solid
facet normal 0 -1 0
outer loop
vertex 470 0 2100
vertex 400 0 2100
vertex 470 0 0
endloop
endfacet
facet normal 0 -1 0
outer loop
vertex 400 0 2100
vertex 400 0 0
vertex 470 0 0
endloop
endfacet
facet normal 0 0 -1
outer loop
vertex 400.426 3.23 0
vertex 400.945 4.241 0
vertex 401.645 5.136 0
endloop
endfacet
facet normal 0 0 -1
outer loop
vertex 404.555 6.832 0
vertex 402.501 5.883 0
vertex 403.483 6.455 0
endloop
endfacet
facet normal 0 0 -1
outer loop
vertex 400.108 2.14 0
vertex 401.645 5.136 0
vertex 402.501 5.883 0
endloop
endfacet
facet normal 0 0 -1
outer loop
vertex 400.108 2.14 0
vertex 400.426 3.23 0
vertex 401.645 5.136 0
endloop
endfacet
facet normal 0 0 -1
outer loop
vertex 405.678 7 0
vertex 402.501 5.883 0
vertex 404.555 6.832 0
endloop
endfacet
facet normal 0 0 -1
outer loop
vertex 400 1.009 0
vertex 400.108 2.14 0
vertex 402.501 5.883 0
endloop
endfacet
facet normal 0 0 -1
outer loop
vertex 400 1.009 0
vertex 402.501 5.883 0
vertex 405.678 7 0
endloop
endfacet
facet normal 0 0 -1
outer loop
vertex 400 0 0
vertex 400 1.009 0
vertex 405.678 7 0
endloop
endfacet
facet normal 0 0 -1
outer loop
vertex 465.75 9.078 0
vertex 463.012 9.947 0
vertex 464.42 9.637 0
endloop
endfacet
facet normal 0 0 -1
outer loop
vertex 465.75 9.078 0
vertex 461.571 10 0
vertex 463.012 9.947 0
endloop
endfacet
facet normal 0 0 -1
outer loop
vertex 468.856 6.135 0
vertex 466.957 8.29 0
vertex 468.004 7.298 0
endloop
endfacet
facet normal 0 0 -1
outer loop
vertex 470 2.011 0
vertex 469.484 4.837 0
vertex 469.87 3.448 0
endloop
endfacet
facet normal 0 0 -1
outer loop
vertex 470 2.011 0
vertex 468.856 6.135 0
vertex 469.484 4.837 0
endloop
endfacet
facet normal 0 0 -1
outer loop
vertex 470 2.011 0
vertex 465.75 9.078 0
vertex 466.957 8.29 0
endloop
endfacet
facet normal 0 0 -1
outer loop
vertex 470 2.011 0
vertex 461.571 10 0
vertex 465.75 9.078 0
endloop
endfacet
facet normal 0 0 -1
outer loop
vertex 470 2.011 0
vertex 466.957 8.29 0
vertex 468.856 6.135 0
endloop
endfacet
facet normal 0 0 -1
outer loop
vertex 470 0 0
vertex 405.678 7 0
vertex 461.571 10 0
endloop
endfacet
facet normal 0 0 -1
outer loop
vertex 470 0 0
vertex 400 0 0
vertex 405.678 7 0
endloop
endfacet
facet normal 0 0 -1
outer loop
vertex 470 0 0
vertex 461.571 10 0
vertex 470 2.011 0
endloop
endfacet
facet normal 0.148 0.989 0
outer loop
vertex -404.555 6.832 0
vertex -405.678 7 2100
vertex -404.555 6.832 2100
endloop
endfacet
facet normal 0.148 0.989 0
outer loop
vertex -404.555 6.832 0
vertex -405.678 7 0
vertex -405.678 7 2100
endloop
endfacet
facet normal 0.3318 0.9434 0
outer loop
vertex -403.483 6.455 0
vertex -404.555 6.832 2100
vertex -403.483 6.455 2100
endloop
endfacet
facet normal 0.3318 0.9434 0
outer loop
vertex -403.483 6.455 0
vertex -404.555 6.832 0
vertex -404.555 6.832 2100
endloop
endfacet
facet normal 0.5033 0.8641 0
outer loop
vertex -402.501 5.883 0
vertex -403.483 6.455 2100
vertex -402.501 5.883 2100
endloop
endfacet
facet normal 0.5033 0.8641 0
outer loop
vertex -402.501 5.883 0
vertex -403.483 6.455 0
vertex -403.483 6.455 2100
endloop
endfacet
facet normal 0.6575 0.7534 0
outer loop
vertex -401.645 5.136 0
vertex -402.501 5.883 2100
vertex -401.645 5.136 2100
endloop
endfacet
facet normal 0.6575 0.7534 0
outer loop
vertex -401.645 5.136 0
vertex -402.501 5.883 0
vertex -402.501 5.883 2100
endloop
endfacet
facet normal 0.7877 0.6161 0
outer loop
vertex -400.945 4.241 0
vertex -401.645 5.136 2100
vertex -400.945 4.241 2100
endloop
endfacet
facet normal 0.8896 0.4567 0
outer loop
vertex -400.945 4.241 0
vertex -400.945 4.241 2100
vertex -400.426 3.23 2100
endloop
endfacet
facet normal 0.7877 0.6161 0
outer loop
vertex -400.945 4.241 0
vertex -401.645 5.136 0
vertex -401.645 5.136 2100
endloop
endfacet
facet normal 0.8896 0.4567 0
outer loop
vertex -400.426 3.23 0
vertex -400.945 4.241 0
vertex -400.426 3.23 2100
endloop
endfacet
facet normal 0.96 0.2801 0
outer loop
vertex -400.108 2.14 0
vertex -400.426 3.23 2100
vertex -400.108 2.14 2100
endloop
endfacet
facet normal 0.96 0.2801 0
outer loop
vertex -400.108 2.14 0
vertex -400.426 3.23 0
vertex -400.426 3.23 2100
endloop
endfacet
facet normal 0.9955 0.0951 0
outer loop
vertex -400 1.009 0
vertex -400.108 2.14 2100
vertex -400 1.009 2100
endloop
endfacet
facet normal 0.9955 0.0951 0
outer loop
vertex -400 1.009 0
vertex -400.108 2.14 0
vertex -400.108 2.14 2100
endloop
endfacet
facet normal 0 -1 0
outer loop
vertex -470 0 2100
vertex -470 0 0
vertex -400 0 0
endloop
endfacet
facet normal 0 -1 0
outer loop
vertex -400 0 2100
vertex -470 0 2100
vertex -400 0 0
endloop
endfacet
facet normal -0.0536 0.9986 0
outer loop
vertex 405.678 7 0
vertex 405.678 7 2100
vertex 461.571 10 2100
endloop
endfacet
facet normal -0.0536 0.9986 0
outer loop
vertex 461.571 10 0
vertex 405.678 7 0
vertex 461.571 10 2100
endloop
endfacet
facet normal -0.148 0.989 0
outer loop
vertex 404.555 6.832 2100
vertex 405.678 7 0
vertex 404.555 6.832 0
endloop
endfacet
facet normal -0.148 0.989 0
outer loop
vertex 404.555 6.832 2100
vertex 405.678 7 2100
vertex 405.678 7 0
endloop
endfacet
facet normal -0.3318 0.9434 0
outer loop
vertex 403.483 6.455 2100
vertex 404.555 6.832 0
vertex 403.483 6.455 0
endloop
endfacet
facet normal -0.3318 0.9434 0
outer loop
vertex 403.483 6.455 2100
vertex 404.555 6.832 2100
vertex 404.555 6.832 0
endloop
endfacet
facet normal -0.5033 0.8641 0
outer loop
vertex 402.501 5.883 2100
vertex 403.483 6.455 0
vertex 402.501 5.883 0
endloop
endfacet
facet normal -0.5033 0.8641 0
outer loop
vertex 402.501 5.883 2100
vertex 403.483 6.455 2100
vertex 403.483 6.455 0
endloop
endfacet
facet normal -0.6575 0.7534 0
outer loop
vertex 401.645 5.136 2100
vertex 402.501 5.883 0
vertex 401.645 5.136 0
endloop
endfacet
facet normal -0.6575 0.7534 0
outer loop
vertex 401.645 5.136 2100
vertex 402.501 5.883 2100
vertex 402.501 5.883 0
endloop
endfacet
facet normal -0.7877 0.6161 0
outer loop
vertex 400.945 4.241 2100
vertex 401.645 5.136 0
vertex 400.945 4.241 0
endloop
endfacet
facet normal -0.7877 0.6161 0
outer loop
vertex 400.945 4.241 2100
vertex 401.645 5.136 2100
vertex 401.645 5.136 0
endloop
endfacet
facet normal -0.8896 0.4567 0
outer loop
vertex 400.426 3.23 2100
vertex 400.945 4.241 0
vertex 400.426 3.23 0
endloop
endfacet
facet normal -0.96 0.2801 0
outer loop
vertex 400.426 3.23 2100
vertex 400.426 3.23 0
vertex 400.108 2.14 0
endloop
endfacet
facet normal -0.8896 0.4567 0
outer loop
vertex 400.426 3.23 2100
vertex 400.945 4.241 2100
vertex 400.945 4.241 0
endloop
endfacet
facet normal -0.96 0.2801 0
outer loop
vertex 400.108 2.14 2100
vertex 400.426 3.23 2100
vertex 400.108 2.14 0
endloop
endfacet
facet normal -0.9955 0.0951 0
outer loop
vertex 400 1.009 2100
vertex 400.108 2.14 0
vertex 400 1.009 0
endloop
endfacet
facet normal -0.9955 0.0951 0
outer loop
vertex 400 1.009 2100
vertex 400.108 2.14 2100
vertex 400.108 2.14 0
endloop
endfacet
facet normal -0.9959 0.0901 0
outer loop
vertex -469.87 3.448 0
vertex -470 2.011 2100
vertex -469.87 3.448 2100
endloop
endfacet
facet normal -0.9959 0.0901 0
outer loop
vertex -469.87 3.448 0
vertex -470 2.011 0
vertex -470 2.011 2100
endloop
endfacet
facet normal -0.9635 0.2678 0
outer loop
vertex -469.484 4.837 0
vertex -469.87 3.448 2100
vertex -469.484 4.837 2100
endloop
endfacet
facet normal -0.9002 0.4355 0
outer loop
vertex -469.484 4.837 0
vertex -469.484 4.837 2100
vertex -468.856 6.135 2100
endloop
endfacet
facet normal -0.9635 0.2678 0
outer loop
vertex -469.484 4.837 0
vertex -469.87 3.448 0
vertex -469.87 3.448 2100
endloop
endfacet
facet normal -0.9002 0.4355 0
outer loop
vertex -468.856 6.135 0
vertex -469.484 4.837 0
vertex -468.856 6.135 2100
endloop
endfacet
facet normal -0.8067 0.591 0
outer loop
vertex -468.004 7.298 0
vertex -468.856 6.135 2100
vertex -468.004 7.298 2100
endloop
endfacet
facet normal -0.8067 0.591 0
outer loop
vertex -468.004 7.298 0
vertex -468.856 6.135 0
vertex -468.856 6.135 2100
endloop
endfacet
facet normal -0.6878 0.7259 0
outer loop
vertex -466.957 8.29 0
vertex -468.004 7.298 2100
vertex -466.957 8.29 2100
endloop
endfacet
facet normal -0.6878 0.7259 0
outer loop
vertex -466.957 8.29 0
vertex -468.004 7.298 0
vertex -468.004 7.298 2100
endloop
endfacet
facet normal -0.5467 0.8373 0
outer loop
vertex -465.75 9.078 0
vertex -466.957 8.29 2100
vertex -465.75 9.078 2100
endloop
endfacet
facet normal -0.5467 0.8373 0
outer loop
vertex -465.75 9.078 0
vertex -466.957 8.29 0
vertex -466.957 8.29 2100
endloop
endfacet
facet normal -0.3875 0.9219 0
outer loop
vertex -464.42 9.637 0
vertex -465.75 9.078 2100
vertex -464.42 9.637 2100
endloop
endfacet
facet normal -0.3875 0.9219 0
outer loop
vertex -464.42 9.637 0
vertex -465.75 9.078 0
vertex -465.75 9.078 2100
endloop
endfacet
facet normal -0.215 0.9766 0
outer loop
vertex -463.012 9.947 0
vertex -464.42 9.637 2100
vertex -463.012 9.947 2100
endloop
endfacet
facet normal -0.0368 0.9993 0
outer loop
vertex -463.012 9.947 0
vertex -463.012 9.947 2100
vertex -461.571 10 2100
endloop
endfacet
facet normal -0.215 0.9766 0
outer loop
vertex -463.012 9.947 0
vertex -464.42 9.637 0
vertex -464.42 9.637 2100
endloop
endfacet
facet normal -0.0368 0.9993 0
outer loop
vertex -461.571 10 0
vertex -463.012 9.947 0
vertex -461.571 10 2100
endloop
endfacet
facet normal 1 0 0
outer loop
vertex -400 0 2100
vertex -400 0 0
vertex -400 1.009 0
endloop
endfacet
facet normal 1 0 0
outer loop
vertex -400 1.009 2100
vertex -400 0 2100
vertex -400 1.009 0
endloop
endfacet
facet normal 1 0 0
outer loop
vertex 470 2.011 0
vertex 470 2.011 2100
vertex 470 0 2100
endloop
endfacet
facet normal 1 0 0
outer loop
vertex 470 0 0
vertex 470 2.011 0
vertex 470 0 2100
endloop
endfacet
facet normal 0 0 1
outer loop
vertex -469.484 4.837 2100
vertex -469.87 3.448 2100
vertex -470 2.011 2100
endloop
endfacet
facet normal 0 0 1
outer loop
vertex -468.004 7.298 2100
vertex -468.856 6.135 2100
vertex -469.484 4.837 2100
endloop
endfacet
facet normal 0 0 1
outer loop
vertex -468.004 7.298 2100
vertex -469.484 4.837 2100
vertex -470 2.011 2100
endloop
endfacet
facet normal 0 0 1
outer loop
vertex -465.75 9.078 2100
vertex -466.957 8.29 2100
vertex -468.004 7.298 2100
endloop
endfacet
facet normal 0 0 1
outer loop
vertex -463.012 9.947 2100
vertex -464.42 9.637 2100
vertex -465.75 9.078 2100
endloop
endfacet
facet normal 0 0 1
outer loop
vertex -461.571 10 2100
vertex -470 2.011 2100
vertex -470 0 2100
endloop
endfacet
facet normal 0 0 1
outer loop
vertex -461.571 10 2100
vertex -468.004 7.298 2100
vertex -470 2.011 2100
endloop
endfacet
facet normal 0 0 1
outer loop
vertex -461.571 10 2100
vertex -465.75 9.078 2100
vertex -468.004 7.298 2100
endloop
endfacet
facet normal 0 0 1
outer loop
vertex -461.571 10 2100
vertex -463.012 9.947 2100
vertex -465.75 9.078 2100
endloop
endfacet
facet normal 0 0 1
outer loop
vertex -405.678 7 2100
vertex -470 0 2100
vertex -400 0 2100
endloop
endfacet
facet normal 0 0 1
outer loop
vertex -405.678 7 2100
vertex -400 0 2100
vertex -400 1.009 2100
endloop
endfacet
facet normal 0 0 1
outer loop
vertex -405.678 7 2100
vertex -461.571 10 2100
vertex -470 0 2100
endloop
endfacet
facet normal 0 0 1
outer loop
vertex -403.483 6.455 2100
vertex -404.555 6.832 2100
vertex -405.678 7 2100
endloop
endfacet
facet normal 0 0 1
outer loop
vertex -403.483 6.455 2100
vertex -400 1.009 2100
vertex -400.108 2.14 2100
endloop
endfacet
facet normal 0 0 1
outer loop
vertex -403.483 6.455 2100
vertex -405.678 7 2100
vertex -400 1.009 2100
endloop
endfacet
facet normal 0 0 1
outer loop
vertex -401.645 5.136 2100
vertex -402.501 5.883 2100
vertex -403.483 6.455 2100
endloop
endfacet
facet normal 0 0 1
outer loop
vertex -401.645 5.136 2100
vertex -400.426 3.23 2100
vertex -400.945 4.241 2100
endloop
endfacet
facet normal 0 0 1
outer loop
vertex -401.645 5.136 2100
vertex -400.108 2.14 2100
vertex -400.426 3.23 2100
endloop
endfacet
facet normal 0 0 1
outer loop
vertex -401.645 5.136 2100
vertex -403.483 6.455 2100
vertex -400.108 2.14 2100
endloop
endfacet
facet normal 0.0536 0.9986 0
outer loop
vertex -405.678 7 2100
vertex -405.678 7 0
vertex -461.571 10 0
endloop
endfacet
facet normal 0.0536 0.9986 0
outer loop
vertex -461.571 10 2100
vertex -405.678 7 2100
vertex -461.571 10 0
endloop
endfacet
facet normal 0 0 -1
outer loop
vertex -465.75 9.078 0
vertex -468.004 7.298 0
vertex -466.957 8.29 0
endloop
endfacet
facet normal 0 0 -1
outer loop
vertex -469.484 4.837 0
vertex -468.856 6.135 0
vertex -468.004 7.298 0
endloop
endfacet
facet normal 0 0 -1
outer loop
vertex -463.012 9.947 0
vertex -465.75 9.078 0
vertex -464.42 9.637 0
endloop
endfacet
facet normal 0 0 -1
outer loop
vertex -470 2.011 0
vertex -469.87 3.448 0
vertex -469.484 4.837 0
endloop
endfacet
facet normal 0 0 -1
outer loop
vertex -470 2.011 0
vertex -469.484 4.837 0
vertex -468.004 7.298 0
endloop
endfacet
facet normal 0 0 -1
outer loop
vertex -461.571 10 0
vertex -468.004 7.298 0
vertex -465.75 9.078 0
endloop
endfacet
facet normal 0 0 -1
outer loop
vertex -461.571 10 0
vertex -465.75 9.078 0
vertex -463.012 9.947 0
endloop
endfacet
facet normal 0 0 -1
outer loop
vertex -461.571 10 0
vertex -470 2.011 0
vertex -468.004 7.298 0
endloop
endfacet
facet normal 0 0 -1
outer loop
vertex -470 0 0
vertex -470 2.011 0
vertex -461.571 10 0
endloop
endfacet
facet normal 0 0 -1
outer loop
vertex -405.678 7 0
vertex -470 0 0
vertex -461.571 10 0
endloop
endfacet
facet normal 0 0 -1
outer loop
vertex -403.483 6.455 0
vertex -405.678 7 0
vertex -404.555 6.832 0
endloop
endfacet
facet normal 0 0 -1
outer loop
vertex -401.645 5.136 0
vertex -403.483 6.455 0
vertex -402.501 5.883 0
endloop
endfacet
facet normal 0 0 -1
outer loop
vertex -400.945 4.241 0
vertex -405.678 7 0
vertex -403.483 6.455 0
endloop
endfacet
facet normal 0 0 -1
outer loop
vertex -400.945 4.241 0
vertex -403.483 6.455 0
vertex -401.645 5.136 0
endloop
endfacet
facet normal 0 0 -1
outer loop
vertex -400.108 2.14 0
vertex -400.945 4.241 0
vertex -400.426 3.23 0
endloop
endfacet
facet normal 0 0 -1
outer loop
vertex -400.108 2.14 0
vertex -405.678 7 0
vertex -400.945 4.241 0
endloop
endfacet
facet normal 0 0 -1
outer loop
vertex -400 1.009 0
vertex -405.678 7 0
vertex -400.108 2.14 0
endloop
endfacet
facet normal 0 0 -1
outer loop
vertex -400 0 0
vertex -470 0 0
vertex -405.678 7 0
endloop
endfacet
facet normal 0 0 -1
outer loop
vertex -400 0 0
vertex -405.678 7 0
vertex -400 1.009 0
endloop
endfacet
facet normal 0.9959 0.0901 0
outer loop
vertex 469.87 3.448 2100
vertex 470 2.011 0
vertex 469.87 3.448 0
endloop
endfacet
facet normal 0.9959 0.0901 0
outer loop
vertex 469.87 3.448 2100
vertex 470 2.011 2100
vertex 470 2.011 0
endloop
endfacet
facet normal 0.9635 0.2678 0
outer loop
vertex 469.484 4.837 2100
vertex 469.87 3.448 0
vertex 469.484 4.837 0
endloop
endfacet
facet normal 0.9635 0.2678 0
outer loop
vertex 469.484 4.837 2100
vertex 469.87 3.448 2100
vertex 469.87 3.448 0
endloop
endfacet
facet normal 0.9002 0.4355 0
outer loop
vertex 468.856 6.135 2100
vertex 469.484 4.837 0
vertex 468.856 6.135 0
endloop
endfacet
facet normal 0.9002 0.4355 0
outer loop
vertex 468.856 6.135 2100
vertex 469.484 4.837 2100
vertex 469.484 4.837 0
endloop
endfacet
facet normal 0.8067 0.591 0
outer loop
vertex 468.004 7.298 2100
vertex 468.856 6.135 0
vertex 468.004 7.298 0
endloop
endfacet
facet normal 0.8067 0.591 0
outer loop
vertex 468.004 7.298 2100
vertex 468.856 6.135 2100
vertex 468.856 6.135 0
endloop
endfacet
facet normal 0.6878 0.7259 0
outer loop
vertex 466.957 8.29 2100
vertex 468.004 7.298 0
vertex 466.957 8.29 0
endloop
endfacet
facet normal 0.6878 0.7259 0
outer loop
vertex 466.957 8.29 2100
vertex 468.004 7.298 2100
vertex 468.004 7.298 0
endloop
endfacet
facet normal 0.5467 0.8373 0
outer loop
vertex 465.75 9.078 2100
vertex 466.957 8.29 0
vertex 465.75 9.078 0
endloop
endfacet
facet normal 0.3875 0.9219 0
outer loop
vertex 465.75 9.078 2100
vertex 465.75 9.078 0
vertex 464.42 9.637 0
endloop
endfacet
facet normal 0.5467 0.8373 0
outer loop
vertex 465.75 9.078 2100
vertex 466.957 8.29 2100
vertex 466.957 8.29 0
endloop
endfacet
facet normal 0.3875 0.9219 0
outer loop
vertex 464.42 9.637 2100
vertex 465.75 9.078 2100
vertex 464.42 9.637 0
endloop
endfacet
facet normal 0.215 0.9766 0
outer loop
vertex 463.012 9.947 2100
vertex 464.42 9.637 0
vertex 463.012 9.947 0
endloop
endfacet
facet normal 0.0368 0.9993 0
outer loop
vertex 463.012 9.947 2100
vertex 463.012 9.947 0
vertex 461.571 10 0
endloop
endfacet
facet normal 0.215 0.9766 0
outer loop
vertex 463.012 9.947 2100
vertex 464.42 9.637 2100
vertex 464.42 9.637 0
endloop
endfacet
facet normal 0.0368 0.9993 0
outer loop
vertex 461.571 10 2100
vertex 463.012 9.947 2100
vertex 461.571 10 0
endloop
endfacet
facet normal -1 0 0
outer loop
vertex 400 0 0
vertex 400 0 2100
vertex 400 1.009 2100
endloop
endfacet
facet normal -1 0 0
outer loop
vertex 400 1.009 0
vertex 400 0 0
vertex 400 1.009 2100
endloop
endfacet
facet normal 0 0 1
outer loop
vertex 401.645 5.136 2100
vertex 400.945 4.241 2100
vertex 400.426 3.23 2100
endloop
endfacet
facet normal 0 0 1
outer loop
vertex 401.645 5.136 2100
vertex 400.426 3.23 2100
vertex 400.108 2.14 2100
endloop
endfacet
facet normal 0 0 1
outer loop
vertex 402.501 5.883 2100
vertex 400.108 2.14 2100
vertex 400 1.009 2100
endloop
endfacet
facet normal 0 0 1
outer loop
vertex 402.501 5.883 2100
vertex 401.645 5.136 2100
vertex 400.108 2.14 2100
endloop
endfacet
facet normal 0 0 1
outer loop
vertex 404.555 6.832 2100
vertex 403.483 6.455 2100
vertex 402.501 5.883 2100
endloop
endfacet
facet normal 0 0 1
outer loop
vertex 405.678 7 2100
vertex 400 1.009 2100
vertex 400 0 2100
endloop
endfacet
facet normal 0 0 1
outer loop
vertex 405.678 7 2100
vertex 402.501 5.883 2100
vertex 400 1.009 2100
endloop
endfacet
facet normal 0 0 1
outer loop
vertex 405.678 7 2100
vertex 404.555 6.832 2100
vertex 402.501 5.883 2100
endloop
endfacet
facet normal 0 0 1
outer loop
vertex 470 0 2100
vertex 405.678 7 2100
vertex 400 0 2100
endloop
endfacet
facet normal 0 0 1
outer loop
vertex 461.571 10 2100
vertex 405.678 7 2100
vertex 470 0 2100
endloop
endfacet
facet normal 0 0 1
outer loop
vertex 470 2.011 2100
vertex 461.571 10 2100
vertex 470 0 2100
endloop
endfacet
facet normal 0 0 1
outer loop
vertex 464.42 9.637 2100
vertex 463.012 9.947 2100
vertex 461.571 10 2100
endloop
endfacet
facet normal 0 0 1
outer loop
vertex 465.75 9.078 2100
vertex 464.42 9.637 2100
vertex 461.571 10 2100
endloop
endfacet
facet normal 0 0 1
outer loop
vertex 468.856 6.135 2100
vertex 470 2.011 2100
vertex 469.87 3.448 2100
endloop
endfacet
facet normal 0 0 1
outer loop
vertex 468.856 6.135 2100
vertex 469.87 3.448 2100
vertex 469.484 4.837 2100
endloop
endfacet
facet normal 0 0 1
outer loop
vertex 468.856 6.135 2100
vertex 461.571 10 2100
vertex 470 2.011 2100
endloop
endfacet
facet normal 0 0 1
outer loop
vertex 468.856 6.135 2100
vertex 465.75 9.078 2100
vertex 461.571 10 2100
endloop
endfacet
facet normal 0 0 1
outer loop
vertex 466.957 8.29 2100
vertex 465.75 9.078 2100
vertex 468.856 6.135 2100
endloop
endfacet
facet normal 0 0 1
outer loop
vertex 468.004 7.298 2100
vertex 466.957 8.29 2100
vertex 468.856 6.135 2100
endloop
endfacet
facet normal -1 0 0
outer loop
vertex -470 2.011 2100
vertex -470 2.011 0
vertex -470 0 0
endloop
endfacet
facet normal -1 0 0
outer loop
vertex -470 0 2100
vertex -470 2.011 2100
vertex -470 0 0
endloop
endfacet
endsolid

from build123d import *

# Parameters (mm, degrees)
SKETCH278_W         = 1600
SKETCH278_H         = 400
EXTRUDE039512_DEPTH = 500


with BuildPart() as extrude039512:
    # Sketch278 (on Sketch) → Extrude039512 (new body, symmetric)
    with BuildSketch(Plane.XZ):
        with Locations((0, 2300)):
            Rectangle(SKETCH278_W, SKETCH278_H)
        with Locations((0, -200)):
            Rectangle(SKETCH278_W, SKETCH278_H)
    extrude(amount=EXTRUDE039512_DEPTH, both=True)


with BuildPart() as trim_two_parts_internal:
    # Sweep012: sweep along a path in Sketch195
    with BuildLine(Plane.XZ) as sweep012_path:
        Line((-400, 2100), (-400, 0))
        Line((-400, 0), (400, 0))
        Line((400, 0), (400, 2100))
        Line((400, 2100), (-400, 2100))
    # Clone2D028 (on Sketch) → Sweep012 (sweep)
    with BuildSketch(Plane.ZY):
        with BuildLine():
            Line((-61.571224, 10), (-5.678418, 7))
            ThreePointArc((-5.678418, 7), (-1.645147, 5.136003), (0, 1.008624))
            Line((0, 1.008624), (0, 0))
            Line((0, 0), (-70, 0))
            Line((-70, 0), (-70, 2.011499))
            ThreePointArc((-70, 2.011499), (-67.503171, 7.81797), (-61.571224, 10))
        make_face()
    sweep(path=sweep012_path.line, is_frenet=True, transition=Transition.RIGHT)

    # Cut078: cut Extrude039512
    add(extrude039512.part, mode=Mode.SUBTRACT)


solid = trim_two_parts_internal.part
